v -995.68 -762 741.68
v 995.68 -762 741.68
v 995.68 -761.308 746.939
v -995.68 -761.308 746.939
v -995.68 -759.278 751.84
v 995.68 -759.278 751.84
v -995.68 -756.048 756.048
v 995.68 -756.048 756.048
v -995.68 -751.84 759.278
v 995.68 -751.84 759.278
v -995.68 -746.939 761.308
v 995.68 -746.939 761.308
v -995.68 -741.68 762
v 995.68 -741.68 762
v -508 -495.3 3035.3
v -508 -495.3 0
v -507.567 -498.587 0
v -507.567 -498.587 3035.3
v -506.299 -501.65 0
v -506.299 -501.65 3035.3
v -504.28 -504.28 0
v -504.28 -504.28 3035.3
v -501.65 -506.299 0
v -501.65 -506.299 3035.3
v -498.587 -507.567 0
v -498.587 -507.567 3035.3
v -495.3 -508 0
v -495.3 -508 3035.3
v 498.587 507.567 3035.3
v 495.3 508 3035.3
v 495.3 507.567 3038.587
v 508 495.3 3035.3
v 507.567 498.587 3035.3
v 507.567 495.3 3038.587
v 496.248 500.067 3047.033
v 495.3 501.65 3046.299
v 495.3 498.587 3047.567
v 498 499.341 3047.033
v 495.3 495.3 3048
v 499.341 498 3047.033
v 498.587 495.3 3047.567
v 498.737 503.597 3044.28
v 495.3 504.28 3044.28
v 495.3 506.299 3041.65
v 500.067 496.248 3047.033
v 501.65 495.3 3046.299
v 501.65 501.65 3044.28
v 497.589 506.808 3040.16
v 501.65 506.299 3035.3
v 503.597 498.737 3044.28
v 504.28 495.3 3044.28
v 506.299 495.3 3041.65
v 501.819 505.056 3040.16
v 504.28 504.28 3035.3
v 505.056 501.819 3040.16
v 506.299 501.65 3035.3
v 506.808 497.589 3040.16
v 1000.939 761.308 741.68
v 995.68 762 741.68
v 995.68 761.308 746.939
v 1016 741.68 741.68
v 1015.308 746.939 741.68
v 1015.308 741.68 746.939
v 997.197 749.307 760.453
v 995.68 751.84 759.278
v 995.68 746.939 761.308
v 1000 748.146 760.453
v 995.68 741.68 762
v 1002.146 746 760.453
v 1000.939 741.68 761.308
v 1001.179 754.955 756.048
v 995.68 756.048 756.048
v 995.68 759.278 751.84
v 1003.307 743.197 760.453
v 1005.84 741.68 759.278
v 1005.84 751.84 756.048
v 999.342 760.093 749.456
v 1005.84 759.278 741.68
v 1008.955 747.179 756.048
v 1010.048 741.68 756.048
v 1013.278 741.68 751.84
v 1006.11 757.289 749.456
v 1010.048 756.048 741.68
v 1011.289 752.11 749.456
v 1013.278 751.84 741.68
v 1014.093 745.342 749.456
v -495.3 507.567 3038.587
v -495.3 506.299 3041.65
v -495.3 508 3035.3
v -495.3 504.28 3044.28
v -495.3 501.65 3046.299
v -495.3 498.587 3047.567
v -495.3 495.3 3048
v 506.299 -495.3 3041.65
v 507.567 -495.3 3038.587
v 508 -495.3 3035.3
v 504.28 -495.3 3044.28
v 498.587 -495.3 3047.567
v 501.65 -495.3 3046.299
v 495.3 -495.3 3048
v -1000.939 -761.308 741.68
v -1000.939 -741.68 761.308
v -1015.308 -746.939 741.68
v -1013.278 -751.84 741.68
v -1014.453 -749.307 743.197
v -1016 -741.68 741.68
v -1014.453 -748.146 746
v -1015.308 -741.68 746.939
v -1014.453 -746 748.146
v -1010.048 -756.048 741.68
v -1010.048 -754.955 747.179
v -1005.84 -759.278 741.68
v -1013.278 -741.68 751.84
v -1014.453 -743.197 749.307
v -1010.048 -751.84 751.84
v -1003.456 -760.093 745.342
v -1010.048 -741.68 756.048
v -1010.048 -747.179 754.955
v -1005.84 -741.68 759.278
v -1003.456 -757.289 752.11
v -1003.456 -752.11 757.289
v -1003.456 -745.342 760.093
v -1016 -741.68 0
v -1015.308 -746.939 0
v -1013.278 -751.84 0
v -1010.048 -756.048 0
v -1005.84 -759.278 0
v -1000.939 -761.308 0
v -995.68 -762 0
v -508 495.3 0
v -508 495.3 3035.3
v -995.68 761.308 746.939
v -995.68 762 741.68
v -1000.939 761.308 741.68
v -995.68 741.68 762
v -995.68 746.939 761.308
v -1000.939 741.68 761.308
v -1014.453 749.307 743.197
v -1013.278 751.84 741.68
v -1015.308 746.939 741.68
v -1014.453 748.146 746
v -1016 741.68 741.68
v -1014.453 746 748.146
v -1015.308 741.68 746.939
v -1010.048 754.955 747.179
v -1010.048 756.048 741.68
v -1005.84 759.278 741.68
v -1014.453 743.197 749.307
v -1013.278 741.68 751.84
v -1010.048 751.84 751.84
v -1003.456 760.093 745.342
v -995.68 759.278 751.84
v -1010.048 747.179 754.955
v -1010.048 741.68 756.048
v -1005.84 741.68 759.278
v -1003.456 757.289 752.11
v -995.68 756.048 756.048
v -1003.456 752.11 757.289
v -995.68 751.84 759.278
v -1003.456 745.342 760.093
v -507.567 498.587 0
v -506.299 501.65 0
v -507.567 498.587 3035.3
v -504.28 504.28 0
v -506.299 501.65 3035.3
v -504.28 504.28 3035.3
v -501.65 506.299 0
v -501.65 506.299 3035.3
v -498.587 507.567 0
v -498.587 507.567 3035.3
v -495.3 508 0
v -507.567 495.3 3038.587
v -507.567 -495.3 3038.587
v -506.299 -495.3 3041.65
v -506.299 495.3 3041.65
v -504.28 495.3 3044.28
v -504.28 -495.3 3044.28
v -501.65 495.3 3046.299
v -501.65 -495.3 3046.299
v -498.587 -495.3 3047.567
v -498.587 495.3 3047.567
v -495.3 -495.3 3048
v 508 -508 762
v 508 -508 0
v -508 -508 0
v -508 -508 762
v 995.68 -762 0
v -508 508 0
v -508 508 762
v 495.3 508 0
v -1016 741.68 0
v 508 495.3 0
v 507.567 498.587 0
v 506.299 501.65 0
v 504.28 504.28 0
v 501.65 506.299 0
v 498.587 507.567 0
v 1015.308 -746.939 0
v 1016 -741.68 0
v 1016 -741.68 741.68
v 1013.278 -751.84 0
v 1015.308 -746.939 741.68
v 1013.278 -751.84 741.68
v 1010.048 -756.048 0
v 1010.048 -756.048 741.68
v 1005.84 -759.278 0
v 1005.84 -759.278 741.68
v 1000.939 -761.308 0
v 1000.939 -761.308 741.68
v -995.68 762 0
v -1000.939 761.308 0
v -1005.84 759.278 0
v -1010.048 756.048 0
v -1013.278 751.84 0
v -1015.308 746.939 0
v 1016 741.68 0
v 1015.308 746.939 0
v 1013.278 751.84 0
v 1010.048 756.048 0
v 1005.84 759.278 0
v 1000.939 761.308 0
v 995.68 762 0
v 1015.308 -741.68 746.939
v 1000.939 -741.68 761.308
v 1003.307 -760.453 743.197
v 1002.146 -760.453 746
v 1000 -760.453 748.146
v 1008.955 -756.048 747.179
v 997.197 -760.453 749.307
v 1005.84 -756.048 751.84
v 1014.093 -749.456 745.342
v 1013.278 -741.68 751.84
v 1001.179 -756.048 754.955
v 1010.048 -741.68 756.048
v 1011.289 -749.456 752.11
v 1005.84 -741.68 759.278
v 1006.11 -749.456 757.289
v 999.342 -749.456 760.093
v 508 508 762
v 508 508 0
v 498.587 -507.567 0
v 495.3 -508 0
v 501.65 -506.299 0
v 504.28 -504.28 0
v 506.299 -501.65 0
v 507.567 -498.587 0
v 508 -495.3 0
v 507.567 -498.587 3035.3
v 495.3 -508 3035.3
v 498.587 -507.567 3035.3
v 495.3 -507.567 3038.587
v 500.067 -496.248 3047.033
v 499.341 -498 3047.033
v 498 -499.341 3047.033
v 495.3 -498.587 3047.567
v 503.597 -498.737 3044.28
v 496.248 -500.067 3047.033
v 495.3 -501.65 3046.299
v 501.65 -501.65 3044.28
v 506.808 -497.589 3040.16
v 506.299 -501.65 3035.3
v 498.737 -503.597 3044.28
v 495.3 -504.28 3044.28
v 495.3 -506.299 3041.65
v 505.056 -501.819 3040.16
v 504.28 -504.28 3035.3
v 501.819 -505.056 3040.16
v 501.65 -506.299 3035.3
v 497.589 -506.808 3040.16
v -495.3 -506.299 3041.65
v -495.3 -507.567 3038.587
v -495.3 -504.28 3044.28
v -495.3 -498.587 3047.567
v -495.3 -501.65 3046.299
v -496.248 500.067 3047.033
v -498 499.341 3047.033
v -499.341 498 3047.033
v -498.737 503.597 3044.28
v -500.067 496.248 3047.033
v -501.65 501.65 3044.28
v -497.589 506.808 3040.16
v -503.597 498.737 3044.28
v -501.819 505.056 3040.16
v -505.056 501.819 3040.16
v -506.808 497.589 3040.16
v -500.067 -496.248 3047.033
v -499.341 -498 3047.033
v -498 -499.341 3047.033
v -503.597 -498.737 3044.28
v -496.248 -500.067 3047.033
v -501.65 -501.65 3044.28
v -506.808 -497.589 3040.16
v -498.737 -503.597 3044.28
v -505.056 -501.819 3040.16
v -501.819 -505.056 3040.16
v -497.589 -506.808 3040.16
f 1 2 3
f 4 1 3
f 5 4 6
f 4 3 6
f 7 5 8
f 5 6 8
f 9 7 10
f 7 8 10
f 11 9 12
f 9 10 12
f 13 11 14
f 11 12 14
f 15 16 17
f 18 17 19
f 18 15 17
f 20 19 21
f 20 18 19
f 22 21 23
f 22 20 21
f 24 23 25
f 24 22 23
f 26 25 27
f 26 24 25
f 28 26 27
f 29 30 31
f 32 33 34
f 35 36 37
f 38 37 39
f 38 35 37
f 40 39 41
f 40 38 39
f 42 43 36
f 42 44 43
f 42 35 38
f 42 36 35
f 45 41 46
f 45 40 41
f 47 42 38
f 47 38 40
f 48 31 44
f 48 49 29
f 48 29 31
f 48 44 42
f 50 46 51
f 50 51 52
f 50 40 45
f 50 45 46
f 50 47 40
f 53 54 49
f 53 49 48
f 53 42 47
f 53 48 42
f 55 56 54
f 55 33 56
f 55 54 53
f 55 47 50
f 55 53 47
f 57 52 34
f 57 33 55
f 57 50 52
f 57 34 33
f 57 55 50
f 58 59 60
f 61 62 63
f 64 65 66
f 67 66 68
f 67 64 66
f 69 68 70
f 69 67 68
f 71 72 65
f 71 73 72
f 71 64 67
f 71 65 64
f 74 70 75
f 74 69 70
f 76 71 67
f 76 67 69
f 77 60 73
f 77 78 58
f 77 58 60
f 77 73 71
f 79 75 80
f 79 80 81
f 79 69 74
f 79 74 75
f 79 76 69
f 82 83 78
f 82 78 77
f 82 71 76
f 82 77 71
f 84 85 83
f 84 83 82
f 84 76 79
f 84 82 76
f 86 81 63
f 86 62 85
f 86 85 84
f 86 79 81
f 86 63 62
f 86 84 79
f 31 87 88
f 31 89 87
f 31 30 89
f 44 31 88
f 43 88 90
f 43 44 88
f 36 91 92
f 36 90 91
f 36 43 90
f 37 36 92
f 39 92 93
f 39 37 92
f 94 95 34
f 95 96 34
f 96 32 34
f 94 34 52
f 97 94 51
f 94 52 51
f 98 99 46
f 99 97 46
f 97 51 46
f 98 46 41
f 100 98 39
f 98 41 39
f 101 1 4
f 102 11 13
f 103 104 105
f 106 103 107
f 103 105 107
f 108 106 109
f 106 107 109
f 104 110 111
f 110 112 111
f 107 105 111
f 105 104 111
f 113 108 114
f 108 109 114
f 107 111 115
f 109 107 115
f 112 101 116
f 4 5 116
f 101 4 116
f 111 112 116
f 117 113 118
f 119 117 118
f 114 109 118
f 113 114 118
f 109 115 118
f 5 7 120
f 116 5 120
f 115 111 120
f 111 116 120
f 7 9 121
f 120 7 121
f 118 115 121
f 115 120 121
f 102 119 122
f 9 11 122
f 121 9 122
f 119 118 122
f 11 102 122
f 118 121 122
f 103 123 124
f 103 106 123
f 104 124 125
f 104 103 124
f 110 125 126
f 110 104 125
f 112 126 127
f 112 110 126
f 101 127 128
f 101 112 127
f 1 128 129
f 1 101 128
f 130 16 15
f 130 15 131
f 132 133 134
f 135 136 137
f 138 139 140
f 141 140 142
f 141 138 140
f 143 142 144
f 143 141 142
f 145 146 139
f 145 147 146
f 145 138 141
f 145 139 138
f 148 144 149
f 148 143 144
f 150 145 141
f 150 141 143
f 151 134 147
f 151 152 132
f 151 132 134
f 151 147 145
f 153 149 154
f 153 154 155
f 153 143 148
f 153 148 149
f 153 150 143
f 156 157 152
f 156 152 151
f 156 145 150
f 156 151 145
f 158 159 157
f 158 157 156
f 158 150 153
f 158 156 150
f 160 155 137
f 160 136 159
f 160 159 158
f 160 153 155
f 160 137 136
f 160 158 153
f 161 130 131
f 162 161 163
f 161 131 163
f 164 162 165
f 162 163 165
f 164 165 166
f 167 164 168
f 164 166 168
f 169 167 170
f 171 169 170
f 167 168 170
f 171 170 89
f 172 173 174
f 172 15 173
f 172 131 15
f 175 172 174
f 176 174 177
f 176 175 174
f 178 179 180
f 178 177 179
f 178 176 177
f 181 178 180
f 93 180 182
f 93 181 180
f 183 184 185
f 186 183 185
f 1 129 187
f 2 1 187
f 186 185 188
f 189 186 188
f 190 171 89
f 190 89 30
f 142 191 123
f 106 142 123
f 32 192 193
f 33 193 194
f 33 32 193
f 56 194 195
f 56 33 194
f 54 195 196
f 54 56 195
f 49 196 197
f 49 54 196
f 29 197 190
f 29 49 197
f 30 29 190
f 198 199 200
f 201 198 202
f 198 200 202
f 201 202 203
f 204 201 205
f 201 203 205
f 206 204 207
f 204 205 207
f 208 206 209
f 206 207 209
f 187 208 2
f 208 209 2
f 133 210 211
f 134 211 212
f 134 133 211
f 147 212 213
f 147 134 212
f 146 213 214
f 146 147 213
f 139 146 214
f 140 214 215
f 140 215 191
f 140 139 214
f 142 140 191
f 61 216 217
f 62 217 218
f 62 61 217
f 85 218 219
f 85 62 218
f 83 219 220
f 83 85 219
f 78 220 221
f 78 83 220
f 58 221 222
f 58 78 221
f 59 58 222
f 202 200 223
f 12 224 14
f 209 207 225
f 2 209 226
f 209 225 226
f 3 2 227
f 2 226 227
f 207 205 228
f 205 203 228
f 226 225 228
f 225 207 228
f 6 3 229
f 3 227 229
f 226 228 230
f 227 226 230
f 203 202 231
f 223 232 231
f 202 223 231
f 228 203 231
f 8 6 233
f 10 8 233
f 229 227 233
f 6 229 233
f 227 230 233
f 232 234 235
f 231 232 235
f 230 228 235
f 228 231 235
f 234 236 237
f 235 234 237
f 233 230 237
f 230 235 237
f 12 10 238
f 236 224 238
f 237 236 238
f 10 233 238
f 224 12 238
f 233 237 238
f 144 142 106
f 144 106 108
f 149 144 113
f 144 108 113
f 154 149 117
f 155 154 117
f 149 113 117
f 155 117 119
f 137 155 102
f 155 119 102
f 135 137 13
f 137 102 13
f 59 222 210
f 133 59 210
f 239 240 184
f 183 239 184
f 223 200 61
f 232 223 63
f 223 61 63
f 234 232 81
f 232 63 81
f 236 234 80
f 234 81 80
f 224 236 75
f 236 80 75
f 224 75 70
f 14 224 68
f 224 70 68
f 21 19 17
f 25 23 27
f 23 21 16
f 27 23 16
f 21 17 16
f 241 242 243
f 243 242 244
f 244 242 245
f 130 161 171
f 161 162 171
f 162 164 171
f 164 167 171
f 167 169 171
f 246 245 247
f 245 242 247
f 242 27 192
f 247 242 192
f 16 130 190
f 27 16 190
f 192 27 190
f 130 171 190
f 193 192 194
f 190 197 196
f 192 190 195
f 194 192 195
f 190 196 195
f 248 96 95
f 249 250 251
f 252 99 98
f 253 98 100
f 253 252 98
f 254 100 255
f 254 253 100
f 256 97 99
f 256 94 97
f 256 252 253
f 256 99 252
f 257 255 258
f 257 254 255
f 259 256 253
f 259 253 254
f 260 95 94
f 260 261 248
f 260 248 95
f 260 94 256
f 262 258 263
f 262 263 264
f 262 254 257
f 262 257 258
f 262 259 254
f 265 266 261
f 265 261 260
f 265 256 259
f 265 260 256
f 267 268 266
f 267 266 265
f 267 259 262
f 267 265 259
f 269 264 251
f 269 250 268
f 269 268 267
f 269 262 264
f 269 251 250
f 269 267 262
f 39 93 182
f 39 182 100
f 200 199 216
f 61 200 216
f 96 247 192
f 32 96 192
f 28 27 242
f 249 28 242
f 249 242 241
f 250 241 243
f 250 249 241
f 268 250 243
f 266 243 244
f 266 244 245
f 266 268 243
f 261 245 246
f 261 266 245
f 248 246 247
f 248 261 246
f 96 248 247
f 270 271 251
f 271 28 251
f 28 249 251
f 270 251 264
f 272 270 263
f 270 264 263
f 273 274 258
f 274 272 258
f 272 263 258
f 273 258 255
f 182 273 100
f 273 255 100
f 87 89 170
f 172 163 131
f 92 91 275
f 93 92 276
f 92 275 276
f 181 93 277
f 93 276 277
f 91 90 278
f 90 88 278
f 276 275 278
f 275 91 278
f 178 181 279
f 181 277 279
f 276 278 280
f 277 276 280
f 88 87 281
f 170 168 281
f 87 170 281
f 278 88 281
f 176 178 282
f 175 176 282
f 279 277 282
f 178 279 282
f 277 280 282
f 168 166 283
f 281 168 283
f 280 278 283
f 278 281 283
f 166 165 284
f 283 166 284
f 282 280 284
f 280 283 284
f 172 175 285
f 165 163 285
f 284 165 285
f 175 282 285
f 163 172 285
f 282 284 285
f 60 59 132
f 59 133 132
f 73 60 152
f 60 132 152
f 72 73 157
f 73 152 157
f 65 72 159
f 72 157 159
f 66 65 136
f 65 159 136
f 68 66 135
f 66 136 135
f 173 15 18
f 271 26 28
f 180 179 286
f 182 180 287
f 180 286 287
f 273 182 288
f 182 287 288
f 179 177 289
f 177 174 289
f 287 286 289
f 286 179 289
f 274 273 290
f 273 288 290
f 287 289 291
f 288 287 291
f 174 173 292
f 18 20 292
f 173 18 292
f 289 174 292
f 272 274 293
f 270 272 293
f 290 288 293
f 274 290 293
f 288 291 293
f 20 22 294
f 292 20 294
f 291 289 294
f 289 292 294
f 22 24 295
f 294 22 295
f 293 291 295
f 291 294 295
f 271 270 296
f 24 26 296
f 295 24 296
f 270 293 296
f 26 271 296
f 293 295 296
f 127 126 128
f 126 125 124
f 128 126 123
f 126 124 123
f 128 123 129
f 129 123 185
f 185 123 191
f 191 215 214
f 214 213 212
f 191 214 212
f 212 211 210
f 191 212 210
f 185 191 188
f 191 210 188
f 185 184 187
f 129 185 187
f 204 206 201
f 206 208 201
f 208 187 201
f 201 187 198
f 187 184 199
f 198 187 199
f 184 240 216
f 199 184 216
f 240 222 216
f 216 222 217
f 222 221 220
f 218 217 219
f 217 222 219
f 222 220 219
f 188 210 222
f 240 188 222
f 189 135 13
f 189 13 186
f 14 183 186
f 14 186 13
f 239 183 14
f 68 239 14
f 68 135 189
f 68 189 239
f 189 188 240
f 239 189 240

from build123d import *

# Parameters (mm, degrees)
F0_W     = 1016
F0_H     = 1016
F1_DEPTH = 3048
F3_DEPTH = 762
F4_R     = 20.32
F5_R     = 12.7


with BuildPart() as f1:
    # F0 (on Top) → F1 (new body)
    with BuildSketch(Plane.XY):
        Rectangle(F0_W, F0_H)
    extrude(amount=F1_DEPTH)

    # F5
    f5_edges = [f1.edges().sort_by_distance(p)[0] for p in [
        (508, 508, 1524),
        (-508, 508, 1524),
        (-508, -508, 1524),
        (508, -508, 1524),
        (0, 508, 3048),
        (-508, 0, 3048),
        (508, 0, 3048),
        (0, -508, 3048),
    ]]
    fillet(f5_edges, radius=F5_R)


with BuildPart() as f3:
    # F2 (on face) → F3 (new body)
    with BuildSketch(Plane.XY):
        Polygon((-1016, 0), (-508, 0), (-508, 508), (0, 508), (0, 762), (-1016, 762), align=None)
        Polygon((508, 508), (508, 0), (1016, 0), (1016, 762), (0, 762), (0, 508), align=None)
        Polygon((1016, 0), (508, 0), (508, -508), (0, -508), (0, -762), (1016, -762), align=None)
        Polygon((-508, -508), (-508, 0), (-1016, 0), (-1016, -762), (0, -762), (0, -508), align=None)
    extrude(amount=F3_DEPTH)

    # F4
    f4_edges = [f3.edges().sort_by_distance(p)[0] for p in [
        (1016, 762, 381),
        (0, 762, 762),
        (-1016, 762, 381),
        (1016, 0, 762),
        (1016, -762, 381),
        (0, -762, 762),
        (-1016, -762, 381),
        (-1016, 0, 762),
    ]]
    fillet(f4_edges, radius=F4_R)


solid = Compound([f1.part, f3.part])
